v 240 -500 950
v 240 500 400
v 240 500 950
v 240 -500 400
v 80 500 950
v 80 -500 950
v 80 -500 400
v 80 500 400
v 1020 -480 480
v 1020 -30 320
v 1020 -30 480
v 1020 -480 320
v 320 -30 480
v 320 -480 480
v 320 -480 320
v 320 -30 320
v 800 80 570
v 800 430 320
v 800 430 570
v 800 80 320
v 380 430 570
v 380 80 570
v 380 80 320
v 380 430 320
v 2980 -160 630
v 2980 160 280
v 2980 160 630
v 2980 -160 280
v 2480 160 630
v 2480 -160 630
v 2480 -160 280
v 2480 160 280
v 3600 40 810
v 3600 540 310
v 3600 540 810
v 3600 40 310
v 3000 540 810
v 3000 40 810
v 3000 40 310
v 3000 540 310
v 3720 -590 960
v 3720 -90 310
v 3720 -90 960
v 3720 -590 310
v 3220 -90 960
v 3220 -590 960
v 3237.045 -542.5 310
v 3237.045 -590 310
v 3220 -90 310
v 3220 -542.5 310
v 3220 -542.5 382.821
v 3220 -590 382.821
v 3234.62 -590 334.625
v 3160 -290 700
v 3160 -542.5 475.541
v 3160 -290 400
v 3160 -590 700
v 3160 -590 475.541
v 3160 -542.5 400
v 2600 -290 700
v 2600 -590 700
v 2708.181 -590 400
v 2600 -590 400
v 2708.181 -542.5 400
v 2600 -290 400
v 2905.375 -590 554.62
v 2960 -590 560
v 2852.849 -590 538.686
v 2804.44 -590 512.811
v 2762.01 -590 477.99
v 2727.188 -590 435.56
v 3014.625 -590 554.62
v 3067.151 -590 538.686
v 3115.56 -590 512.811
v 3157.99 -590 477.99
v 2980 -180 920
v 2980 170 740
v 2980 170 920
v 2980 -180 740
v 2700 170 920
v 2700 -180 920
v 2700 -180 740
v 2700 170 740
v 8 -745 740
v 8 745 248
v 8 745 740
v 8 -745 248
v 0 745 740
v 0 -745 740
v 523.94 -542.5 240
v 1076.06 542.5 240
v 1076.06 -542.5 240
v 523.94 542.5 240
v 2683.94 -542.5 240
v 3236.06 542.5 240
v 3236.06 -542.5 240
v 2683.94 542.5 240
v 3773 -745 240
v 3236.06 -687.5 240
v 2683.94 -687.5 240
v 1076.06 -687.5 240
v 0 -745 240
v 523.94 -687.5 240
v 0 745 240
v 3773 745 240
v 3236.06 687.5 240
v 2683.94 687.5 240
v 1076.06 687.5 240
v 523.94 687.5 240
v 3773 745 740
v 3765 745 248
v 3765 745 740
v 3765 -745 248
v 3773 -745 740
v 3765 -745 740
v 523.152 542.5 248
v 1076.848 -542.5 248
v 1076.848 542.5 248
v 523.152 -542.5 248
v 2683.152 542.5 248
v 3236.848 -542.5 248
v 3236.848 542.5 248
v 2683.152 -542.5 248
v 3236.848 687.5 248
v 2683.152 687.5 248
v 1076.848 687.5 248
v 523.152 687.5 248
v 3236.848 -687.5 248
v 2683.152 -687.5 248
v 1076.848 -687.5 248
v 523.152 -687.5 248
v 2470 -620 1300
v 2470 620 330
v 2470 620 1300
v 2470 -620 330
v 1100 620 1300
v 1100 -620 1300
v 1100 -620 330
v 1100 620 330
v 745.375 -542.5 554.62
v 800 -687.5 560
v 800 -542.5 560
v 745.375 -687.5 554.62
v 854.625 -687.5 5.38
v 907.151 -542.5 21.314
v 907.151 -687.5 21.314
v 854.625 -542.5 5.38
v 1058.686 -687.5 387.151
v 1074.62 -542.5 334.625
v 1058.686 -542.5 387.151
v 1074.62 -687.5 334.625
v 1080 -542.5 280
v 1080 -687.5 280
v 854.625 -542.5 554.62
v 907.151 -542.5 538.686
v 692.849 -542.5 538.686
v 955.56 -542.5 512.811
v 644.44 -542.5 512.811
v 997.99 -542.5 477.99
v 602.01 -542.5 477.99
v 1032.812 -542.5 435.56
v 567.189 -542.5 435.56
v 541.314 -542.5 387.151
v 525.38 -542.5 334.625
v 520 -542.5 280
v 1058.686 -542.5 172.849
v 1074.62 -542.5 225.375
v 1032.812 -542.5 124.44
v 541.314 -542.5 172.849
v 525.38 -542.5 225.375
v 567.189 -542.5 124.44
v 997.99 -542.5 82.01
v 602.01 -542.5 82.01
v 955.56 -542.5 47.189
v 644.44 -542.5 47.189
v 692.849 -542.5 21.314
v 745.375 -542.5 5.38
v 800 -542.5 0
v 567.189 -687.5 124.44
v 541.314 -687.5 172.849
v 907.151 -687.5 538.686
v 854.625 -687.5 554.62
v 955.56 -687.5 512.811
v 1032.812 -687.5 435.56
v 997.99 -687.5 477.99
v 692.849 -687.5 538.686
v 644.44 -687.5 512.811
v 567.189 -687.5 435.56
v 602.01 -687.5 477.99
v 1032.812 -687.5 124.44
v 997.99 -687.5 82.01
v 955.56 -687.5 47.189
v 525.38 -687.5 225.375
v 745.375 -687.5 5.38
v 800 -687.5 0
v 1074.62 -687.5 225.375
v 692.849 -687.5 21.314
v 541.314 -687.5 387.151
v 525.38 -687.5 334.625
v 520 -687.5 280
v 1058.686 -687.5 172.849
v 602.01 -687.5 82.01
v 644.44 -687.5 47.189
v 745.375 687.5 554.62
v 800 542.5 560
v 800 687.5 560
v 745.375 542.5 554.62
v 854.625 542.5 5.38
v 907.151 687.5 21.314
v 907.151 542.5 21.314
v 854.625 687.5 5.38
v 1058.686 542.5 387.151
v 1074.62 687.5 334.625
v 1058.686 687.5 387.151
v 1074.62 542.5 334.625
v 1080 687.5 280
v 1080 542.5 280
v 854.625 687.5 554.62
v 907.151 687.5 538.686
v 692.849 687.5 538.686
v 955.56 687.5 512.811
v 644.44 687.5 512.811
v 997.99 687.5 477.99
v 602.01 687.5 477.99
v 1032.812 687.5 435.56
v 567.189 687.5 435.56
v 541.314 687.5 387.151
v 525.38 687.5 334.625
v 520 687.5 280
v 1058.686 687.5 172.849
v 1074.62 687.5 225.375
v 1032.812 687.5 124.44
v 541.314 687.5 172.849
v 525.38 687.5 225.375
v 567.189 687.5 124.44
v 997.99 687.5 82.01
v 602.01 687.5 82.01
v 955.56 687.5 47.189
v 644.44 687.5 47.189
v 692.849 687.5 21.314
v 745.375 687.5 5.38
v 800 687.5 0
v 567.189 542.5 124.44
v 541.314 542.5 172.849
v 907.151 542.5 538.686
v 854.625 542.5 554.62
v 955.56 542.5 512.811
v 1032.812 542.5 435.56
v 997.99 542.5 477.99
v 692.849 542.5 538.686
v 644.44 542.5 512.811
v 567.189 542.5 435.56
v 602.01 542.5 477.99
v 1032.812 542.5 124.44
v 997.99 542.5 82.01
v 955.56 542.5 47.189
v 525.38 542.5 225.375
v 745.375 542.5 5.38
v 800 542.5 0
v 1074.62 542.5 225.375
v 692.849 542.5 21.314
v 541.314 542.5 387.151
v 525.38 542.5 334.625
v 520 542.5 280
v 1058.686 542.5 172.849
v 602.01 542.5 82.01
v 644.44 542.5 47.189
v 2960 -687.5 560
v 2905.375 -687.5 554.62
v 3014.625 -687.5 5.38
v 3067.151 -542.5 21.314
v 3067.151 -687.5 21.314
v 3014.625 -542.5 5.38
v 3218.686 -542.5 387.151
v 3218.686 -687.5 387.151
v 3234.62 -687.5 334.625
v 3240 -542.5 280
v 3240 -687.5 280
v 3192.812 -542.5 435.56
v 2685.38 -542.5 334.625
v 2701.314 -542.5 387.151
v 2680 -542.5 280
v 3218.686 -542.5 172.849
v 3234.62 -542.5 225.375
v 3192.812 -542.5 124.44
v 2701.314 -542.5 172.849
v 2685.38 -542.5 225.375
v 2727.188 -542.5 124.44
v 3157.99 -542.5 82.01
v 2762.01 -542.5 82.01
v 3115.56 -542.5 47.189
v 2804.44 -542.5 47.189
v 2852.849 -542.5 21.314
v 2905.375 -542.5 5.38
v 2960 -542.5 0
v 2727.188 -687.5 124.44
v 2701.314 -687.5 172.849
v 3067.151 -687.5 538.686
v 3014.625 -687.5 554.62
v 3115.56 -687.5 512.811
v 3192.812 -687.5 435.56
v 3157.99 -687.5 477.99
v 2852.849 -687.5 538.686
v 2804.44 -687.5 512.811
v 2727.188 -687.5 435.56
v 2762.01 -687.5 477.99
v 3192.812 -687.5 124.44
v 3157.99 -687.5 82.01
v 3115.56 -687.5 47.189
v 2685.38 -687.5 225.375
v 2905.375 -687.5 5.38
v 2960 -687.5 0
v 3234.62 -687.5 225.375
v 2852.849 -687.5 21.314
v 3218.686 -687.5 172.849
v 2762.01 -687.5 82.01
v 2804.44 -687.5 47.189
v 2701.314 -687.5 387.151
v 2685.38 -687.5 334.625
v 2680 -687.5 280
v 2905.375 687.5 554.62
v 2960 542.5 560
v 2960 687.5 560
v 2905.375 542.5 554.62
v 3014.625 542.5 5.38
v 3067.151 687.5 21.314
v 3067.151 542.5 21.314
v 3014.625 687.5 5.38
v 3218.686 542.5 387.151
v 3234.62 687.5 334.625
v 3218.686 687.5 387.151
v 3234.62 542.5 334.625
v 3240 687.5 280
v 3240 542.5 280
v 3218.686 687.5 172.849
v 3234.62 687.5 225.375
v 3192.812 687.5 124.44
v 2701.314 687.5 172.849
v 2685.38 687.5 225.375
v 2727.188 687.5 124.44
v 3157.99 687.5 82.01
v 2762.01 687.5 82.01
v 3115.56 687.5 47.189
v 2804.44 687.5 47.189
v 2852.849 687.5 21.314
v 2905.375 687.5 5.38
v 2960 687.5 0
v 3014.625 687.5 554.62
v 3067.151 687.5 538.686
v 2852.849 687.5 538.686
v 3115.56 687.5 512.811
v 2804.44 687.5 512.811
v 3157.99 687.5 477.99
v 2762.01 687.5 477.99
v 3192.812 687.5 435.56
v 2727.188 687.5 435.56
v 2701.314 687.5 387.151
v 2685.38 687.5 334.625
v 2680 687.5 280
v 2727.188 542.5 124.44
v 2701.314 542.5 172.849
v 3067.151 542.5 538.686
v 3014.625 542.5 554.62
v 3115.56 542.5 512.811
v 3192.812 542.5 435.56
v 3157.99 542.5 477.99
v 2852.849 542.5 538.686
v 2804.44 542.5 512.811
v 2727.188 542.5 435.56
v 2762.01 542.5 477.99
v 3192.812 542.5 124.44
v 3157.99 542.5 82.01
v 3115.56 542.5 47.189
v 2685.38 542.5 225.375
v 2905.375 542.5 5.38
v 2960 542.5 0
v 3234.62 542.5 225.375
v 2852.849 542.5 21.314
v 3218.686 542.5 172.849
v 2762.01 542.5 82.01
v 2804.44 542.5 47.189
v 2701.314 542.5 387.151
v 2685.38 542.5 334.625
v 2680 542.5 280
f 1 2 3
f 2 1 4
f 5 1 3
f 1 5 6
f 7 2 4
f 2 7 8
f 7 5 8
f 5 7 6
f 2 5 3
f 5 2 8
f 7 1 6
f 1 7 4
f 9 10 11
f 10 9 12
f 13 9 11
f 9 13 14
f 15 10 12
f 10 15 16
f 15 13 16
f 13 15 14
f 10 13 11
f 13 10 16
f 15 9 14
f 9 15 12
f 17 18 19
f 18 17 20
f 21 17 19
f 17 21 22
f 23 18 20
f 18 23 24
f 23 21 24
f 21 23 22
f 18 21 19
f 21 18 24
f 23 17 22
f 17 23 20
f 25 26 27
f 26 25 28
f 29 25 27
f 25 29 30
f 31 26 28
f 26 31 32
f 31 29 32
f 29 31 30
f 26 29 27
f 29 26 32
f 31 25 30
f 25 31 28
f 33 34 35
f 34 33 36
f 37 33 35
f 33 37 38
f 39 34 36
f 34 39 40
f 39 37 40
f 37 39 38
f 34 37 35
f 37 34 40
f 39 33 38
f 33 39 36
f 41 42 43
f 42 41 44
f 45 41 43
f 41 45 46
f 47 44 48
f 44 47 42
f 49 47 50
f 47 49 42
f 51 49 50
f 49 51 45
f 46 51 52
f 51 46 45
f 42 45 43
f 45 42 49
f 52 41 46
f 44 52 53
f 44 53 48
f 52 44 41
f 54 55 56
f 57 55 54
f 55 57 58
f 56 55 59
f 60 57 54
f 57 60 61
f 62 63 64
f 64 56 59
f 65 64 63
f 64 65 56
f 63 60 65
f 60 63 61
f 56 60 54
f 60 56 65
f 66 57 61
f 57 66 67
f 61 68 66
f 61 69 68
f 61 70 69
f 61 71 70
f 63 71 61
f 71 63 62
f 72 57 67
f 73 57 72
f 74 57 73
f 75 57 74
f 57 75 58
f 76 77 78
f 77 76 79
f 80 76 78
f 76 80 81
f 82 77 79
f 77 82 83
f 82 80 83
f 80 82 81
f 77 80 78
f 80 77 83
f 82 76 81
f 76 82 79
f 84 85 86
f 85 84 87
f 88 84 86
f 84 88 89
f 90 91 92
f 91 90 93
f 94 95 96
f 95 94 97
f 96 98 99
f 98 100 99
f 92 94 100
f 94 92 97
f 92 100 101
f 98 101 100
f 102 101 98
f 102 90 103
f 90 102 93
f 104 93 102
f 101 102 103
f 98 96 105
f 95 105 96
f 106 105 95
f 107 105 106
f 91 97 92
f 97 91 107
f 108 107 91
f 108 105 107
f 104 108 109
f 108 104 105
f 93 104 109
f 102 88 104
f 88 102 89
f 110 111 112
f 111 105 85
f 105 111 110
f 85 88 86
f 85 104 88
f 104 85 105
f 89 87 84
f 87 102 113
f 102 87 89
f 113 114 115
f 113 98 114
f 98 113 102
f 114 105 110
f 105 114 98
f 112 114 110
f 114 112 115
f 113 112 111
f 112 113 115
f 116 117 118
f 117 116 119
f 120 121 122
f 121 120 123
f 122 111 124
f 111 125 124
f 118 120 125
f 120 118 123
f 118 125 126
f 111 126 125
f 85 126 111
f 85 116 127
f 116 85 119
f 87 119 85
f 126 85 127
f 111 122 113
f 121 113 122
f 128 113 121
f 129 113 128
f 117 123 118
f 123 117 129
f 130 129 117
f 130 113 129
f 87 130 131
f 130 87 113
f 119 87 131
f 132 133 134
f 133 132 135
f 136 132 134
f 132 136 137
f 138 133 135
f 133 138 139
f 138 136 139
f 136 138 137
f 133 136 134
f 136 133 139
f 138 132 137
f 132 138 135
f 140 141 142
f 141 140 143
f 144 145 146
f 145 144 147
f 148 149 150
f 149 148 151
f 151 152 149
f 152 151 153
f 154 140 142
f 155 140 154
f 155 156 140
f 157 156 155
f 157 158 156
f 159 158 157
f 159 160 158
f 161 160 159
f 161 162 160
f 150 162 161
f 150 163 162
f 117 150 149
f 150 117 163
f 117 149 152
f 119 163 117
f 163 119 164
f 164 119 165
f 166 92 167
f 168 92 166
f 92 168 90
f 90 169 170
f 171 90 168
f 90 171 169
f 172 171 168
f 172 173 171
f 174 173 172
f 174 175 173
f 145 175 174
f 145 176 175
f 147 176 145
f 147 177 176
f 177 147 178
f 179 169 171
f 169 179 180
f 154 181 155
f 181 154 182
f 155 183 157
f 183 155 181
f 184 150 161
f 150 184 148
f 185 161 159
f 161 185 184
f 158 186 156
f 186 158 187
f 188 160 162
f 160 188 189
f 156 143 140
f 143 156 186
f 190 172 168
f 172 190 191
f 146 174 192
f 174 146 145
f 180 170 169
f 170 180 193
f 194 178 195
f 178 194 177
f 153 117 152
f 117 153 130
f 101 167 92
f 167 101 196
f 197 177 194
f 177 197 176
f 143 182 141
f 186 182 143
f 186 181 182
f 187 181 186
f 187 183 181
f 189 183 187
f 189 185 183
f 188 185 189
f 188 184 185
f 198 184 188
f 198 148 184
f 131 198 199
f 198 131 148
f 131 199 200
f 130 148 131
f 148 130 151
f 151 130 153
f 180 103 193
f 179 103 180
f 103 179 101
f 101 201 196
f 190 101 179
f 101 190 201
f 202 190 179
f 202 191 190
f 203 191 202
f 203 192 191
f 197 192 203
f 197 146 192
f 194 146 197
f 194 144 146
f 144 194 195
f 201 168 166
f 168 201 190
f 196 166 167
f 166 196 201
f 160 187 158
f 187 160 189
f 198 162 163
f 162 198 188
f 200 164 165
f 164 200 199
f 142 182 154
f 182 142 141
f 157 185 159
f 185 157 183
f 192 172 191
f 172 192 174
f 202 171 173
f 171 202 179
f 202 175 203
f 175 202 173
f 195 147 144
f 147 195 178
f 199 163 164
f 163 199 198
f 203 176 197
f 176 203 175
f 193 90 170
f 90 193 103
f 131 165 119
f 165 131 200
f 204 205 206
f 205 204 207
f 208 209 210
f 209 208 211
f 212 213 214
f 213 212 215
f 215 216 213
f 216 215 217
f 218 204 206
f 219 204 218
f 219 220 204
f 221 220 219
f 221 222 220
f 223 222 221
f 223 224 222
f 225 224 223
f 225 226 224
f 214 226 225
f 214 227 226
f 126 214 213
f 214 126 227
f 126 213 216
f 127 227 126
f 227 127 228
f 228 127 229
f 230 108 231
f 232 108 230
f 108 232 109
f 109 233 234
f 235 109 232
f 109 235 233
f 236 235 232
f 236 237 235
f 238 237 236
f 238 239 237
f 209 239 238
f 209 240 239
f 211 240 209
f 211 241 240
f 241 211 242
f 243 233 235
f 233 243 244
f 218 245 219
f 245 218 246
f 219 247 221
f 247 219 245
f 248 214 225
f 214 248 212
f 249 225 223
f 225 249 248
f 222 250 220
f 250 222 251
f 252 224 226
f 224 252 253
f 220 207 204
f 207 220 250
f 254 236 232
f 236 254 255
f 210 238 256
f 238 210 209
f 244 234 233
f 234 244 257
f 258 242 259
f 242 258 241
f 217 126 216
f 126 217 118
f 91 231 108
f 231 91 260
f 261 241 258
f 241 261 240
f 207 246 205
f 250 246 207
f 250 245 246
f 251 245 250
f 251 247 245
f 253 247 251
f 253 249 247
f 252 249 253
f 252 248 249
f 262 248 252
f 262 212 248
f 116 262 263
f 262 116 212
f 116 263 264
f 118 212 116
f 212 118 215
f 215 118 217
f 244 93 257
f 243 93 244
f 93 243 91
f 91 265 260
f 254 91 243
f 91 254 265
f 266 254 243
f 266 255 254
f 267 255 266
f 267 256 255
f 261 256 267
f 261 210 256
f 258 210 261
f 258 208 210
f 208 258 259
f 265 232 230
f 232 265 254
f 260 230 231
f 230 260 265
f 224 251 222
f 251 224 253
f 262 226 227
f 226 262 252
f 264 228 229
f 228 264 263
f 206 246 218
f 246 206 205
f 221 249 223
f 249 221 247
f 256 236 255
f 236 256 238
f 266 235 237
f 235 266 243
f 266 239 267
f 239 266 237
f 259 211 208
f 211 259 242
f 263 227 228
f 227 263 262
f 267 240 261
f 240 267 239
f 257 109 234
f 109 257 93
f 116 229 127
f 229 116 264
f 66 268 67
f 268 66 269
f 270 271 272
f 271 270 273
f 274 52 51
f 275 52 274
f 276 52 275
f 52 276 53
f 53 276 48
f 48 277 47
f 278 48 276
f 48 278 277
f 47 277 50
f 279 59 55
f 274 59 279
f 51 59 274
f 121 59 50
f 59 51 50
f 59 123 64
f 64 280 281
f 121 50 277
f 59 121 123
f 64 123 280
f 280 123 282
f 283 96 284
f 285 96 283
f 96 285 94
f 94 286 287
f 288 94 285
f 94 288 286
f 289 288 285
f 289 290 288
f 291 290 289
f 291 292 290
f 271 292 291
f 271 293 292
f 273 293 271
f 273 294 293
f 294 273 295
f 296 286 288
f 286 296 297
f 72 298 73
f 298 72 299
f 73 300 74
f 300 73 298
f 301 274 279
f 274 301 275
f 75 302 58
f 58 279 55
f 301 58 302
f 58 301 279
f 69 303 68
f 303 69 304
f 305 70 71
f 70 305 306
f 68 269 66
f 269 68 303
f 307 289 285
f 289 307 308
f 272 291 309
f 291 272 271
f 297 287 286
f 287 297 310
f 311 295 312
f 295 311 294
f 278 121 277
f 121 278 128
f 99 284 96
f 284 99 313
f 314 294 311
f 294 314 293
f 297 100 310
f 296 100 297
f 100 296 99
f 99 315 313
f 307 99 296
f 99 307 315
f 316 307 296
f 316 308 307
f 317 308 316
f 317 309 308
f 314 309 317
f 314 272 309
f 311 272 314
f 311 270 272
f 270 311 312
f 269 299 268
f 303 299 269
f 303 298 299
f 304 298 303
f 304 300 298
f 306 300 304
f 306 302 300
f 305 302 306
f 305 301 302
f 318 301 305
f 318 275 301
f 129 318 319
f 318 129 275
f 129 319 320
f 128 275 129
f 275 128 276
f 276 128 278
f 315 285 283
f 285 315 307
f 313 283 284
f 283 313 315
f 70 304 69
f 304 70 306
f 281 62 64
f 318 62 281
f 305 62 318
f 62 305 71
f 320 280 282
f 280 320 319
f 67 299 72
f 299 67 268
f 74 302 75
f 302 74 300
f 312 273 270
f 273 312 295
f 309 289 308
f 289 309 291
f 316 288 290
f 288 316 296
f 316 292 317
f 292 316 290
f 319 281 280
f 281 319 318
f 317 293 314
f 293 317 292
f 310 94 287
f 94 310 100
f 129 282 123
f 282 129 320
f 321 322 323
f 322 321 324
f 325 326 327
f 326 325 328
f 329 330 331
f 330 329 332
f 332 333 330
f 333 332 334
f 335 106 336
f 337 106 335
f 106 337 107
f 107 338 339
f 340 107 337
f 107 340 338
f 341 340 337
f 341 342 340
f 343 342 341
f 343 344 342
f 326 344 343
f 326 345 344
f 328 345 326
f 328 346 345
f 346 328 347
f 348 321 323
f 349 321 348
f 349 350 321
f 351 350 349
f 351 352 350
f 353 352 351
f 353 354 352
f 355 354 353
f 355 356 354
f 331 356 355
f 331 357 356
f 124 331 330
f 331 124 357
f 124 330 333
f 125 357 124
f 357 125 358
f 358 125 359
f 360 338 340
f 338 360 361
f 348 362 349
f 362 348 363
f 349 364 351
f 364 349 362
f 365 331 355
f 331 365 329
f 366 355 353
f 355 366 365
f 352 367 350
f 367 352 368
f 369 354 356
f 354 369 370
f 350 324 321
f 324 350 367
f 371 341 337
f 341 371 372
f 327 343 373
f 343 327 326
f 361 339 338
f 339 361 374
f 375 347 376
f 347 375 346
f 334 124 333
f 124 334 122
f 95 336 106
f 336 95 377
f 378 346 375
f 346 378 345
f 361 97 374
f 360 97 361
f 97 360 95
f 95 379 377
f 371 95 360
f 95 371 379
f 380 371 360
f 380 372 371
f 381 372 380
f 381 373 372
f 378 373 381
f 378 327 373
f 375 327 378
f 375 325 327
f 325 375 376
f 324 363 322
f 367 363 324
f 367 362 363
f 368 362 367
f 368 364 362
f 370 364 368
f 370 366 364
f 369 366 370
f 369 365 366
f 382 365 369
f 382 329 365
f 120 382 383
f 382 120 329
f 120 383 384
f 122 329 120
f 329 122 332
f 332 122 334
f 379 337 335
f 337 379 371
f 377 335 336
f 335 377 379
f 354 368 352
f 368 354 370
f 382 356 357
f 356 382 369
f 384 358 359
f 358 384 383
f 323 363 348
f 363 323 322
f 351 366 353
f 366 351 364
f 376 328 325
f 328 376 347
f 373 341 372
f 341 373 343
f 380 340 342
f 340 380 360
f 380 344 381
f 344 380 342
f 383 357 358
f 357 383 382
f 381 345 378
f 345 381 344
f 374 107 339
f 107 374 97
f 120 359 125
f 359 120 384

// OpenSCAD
// PRELIMINARY ENVELOPES ONLY. Units mm. NOT FOR FABRICATION.
$fn=32;
// CND: Конденсатор + обдув
color([0.2196078431372549, 0.7411764705882353, 0.9725490196078431]) translate([80, -500, 400]) cube([160, 1000, 550]);
// WTR: Бак холодной воды
color([0.1450980392156863, 0.38823529411764707, 0.9215686274509803]) translate([320, -480, 320]) cube([700, 450, 160]);
// ELE: Электрика и насосы
color([0.6549019607843137, 0.5450980392156862, 0.9803921568627451]) translate([380, 80, 320]) cube([420, 350, 250]);
// GBX: Штатная КПП
color([0.5803921568627451, 0.6392156862745098, 0.7215686274509804]) translate([2480, -160, 280]) cube([500, 320, 350]);
// ENG: Паровая машина
color([0.984313725490196, 0.5725490196078431, 0.23529411764705882]) translate([3000, 40, 310]) cube([600, 500, 500]);
// STM: Генератор + горелка
color([0.9372549019607843, 0.26666666666666666, 0.26666666666666666]) translate([3220, -590, 310]) cube([500, 500, 650]);
// FUE: Топливный бак
color([0.9176470588235294, 0.7019607843137254, 0.03137254901960784]) translate([2600, -590, 400]) cube([560, 300, 300]);
// RCV: Приемник конденсата
color([0.0784313725490196, 0.7215686274509804, 0.6509803921568628]) translate([2700, -180, 740]) cube([280, 350, 180]);
color([0.6,0.6,0.6,0.3]) translate([0,-745,240]) cube([8,1490,500]);
color([0.6,0.6,0.6,0.3]) translate([3765,-745,240]) cube([8,1490,500]);
color([0.6,0.6,0.6,0.2]) translate([0,-745,240]) cube([3765,1490,8]);
color([0.6,0.6,0.6,0.12]) translate([1100,-620,330]) cube([1370,1240,970]);
color([0.2,0.2,0.2]) translate([800,-615,280]) rotate([90,0,0]) cylinder(r=280,h=145,center=true);
color([0.2,0.2,0.2]) translate([800,615,280]) rotate([90,0,0]) cylinder(r=280,h=145,center=true);
color([0.2,0.2,0.2]) translate([2960,-615,280]) rotate([90,0,0]) cylinder(r=280,h=145,center=true);
color([0.2,0.2,0.2]) translate([2960,615,280]) rotate([90,0,0]) cylinder(r=280,h=145,center=true);
